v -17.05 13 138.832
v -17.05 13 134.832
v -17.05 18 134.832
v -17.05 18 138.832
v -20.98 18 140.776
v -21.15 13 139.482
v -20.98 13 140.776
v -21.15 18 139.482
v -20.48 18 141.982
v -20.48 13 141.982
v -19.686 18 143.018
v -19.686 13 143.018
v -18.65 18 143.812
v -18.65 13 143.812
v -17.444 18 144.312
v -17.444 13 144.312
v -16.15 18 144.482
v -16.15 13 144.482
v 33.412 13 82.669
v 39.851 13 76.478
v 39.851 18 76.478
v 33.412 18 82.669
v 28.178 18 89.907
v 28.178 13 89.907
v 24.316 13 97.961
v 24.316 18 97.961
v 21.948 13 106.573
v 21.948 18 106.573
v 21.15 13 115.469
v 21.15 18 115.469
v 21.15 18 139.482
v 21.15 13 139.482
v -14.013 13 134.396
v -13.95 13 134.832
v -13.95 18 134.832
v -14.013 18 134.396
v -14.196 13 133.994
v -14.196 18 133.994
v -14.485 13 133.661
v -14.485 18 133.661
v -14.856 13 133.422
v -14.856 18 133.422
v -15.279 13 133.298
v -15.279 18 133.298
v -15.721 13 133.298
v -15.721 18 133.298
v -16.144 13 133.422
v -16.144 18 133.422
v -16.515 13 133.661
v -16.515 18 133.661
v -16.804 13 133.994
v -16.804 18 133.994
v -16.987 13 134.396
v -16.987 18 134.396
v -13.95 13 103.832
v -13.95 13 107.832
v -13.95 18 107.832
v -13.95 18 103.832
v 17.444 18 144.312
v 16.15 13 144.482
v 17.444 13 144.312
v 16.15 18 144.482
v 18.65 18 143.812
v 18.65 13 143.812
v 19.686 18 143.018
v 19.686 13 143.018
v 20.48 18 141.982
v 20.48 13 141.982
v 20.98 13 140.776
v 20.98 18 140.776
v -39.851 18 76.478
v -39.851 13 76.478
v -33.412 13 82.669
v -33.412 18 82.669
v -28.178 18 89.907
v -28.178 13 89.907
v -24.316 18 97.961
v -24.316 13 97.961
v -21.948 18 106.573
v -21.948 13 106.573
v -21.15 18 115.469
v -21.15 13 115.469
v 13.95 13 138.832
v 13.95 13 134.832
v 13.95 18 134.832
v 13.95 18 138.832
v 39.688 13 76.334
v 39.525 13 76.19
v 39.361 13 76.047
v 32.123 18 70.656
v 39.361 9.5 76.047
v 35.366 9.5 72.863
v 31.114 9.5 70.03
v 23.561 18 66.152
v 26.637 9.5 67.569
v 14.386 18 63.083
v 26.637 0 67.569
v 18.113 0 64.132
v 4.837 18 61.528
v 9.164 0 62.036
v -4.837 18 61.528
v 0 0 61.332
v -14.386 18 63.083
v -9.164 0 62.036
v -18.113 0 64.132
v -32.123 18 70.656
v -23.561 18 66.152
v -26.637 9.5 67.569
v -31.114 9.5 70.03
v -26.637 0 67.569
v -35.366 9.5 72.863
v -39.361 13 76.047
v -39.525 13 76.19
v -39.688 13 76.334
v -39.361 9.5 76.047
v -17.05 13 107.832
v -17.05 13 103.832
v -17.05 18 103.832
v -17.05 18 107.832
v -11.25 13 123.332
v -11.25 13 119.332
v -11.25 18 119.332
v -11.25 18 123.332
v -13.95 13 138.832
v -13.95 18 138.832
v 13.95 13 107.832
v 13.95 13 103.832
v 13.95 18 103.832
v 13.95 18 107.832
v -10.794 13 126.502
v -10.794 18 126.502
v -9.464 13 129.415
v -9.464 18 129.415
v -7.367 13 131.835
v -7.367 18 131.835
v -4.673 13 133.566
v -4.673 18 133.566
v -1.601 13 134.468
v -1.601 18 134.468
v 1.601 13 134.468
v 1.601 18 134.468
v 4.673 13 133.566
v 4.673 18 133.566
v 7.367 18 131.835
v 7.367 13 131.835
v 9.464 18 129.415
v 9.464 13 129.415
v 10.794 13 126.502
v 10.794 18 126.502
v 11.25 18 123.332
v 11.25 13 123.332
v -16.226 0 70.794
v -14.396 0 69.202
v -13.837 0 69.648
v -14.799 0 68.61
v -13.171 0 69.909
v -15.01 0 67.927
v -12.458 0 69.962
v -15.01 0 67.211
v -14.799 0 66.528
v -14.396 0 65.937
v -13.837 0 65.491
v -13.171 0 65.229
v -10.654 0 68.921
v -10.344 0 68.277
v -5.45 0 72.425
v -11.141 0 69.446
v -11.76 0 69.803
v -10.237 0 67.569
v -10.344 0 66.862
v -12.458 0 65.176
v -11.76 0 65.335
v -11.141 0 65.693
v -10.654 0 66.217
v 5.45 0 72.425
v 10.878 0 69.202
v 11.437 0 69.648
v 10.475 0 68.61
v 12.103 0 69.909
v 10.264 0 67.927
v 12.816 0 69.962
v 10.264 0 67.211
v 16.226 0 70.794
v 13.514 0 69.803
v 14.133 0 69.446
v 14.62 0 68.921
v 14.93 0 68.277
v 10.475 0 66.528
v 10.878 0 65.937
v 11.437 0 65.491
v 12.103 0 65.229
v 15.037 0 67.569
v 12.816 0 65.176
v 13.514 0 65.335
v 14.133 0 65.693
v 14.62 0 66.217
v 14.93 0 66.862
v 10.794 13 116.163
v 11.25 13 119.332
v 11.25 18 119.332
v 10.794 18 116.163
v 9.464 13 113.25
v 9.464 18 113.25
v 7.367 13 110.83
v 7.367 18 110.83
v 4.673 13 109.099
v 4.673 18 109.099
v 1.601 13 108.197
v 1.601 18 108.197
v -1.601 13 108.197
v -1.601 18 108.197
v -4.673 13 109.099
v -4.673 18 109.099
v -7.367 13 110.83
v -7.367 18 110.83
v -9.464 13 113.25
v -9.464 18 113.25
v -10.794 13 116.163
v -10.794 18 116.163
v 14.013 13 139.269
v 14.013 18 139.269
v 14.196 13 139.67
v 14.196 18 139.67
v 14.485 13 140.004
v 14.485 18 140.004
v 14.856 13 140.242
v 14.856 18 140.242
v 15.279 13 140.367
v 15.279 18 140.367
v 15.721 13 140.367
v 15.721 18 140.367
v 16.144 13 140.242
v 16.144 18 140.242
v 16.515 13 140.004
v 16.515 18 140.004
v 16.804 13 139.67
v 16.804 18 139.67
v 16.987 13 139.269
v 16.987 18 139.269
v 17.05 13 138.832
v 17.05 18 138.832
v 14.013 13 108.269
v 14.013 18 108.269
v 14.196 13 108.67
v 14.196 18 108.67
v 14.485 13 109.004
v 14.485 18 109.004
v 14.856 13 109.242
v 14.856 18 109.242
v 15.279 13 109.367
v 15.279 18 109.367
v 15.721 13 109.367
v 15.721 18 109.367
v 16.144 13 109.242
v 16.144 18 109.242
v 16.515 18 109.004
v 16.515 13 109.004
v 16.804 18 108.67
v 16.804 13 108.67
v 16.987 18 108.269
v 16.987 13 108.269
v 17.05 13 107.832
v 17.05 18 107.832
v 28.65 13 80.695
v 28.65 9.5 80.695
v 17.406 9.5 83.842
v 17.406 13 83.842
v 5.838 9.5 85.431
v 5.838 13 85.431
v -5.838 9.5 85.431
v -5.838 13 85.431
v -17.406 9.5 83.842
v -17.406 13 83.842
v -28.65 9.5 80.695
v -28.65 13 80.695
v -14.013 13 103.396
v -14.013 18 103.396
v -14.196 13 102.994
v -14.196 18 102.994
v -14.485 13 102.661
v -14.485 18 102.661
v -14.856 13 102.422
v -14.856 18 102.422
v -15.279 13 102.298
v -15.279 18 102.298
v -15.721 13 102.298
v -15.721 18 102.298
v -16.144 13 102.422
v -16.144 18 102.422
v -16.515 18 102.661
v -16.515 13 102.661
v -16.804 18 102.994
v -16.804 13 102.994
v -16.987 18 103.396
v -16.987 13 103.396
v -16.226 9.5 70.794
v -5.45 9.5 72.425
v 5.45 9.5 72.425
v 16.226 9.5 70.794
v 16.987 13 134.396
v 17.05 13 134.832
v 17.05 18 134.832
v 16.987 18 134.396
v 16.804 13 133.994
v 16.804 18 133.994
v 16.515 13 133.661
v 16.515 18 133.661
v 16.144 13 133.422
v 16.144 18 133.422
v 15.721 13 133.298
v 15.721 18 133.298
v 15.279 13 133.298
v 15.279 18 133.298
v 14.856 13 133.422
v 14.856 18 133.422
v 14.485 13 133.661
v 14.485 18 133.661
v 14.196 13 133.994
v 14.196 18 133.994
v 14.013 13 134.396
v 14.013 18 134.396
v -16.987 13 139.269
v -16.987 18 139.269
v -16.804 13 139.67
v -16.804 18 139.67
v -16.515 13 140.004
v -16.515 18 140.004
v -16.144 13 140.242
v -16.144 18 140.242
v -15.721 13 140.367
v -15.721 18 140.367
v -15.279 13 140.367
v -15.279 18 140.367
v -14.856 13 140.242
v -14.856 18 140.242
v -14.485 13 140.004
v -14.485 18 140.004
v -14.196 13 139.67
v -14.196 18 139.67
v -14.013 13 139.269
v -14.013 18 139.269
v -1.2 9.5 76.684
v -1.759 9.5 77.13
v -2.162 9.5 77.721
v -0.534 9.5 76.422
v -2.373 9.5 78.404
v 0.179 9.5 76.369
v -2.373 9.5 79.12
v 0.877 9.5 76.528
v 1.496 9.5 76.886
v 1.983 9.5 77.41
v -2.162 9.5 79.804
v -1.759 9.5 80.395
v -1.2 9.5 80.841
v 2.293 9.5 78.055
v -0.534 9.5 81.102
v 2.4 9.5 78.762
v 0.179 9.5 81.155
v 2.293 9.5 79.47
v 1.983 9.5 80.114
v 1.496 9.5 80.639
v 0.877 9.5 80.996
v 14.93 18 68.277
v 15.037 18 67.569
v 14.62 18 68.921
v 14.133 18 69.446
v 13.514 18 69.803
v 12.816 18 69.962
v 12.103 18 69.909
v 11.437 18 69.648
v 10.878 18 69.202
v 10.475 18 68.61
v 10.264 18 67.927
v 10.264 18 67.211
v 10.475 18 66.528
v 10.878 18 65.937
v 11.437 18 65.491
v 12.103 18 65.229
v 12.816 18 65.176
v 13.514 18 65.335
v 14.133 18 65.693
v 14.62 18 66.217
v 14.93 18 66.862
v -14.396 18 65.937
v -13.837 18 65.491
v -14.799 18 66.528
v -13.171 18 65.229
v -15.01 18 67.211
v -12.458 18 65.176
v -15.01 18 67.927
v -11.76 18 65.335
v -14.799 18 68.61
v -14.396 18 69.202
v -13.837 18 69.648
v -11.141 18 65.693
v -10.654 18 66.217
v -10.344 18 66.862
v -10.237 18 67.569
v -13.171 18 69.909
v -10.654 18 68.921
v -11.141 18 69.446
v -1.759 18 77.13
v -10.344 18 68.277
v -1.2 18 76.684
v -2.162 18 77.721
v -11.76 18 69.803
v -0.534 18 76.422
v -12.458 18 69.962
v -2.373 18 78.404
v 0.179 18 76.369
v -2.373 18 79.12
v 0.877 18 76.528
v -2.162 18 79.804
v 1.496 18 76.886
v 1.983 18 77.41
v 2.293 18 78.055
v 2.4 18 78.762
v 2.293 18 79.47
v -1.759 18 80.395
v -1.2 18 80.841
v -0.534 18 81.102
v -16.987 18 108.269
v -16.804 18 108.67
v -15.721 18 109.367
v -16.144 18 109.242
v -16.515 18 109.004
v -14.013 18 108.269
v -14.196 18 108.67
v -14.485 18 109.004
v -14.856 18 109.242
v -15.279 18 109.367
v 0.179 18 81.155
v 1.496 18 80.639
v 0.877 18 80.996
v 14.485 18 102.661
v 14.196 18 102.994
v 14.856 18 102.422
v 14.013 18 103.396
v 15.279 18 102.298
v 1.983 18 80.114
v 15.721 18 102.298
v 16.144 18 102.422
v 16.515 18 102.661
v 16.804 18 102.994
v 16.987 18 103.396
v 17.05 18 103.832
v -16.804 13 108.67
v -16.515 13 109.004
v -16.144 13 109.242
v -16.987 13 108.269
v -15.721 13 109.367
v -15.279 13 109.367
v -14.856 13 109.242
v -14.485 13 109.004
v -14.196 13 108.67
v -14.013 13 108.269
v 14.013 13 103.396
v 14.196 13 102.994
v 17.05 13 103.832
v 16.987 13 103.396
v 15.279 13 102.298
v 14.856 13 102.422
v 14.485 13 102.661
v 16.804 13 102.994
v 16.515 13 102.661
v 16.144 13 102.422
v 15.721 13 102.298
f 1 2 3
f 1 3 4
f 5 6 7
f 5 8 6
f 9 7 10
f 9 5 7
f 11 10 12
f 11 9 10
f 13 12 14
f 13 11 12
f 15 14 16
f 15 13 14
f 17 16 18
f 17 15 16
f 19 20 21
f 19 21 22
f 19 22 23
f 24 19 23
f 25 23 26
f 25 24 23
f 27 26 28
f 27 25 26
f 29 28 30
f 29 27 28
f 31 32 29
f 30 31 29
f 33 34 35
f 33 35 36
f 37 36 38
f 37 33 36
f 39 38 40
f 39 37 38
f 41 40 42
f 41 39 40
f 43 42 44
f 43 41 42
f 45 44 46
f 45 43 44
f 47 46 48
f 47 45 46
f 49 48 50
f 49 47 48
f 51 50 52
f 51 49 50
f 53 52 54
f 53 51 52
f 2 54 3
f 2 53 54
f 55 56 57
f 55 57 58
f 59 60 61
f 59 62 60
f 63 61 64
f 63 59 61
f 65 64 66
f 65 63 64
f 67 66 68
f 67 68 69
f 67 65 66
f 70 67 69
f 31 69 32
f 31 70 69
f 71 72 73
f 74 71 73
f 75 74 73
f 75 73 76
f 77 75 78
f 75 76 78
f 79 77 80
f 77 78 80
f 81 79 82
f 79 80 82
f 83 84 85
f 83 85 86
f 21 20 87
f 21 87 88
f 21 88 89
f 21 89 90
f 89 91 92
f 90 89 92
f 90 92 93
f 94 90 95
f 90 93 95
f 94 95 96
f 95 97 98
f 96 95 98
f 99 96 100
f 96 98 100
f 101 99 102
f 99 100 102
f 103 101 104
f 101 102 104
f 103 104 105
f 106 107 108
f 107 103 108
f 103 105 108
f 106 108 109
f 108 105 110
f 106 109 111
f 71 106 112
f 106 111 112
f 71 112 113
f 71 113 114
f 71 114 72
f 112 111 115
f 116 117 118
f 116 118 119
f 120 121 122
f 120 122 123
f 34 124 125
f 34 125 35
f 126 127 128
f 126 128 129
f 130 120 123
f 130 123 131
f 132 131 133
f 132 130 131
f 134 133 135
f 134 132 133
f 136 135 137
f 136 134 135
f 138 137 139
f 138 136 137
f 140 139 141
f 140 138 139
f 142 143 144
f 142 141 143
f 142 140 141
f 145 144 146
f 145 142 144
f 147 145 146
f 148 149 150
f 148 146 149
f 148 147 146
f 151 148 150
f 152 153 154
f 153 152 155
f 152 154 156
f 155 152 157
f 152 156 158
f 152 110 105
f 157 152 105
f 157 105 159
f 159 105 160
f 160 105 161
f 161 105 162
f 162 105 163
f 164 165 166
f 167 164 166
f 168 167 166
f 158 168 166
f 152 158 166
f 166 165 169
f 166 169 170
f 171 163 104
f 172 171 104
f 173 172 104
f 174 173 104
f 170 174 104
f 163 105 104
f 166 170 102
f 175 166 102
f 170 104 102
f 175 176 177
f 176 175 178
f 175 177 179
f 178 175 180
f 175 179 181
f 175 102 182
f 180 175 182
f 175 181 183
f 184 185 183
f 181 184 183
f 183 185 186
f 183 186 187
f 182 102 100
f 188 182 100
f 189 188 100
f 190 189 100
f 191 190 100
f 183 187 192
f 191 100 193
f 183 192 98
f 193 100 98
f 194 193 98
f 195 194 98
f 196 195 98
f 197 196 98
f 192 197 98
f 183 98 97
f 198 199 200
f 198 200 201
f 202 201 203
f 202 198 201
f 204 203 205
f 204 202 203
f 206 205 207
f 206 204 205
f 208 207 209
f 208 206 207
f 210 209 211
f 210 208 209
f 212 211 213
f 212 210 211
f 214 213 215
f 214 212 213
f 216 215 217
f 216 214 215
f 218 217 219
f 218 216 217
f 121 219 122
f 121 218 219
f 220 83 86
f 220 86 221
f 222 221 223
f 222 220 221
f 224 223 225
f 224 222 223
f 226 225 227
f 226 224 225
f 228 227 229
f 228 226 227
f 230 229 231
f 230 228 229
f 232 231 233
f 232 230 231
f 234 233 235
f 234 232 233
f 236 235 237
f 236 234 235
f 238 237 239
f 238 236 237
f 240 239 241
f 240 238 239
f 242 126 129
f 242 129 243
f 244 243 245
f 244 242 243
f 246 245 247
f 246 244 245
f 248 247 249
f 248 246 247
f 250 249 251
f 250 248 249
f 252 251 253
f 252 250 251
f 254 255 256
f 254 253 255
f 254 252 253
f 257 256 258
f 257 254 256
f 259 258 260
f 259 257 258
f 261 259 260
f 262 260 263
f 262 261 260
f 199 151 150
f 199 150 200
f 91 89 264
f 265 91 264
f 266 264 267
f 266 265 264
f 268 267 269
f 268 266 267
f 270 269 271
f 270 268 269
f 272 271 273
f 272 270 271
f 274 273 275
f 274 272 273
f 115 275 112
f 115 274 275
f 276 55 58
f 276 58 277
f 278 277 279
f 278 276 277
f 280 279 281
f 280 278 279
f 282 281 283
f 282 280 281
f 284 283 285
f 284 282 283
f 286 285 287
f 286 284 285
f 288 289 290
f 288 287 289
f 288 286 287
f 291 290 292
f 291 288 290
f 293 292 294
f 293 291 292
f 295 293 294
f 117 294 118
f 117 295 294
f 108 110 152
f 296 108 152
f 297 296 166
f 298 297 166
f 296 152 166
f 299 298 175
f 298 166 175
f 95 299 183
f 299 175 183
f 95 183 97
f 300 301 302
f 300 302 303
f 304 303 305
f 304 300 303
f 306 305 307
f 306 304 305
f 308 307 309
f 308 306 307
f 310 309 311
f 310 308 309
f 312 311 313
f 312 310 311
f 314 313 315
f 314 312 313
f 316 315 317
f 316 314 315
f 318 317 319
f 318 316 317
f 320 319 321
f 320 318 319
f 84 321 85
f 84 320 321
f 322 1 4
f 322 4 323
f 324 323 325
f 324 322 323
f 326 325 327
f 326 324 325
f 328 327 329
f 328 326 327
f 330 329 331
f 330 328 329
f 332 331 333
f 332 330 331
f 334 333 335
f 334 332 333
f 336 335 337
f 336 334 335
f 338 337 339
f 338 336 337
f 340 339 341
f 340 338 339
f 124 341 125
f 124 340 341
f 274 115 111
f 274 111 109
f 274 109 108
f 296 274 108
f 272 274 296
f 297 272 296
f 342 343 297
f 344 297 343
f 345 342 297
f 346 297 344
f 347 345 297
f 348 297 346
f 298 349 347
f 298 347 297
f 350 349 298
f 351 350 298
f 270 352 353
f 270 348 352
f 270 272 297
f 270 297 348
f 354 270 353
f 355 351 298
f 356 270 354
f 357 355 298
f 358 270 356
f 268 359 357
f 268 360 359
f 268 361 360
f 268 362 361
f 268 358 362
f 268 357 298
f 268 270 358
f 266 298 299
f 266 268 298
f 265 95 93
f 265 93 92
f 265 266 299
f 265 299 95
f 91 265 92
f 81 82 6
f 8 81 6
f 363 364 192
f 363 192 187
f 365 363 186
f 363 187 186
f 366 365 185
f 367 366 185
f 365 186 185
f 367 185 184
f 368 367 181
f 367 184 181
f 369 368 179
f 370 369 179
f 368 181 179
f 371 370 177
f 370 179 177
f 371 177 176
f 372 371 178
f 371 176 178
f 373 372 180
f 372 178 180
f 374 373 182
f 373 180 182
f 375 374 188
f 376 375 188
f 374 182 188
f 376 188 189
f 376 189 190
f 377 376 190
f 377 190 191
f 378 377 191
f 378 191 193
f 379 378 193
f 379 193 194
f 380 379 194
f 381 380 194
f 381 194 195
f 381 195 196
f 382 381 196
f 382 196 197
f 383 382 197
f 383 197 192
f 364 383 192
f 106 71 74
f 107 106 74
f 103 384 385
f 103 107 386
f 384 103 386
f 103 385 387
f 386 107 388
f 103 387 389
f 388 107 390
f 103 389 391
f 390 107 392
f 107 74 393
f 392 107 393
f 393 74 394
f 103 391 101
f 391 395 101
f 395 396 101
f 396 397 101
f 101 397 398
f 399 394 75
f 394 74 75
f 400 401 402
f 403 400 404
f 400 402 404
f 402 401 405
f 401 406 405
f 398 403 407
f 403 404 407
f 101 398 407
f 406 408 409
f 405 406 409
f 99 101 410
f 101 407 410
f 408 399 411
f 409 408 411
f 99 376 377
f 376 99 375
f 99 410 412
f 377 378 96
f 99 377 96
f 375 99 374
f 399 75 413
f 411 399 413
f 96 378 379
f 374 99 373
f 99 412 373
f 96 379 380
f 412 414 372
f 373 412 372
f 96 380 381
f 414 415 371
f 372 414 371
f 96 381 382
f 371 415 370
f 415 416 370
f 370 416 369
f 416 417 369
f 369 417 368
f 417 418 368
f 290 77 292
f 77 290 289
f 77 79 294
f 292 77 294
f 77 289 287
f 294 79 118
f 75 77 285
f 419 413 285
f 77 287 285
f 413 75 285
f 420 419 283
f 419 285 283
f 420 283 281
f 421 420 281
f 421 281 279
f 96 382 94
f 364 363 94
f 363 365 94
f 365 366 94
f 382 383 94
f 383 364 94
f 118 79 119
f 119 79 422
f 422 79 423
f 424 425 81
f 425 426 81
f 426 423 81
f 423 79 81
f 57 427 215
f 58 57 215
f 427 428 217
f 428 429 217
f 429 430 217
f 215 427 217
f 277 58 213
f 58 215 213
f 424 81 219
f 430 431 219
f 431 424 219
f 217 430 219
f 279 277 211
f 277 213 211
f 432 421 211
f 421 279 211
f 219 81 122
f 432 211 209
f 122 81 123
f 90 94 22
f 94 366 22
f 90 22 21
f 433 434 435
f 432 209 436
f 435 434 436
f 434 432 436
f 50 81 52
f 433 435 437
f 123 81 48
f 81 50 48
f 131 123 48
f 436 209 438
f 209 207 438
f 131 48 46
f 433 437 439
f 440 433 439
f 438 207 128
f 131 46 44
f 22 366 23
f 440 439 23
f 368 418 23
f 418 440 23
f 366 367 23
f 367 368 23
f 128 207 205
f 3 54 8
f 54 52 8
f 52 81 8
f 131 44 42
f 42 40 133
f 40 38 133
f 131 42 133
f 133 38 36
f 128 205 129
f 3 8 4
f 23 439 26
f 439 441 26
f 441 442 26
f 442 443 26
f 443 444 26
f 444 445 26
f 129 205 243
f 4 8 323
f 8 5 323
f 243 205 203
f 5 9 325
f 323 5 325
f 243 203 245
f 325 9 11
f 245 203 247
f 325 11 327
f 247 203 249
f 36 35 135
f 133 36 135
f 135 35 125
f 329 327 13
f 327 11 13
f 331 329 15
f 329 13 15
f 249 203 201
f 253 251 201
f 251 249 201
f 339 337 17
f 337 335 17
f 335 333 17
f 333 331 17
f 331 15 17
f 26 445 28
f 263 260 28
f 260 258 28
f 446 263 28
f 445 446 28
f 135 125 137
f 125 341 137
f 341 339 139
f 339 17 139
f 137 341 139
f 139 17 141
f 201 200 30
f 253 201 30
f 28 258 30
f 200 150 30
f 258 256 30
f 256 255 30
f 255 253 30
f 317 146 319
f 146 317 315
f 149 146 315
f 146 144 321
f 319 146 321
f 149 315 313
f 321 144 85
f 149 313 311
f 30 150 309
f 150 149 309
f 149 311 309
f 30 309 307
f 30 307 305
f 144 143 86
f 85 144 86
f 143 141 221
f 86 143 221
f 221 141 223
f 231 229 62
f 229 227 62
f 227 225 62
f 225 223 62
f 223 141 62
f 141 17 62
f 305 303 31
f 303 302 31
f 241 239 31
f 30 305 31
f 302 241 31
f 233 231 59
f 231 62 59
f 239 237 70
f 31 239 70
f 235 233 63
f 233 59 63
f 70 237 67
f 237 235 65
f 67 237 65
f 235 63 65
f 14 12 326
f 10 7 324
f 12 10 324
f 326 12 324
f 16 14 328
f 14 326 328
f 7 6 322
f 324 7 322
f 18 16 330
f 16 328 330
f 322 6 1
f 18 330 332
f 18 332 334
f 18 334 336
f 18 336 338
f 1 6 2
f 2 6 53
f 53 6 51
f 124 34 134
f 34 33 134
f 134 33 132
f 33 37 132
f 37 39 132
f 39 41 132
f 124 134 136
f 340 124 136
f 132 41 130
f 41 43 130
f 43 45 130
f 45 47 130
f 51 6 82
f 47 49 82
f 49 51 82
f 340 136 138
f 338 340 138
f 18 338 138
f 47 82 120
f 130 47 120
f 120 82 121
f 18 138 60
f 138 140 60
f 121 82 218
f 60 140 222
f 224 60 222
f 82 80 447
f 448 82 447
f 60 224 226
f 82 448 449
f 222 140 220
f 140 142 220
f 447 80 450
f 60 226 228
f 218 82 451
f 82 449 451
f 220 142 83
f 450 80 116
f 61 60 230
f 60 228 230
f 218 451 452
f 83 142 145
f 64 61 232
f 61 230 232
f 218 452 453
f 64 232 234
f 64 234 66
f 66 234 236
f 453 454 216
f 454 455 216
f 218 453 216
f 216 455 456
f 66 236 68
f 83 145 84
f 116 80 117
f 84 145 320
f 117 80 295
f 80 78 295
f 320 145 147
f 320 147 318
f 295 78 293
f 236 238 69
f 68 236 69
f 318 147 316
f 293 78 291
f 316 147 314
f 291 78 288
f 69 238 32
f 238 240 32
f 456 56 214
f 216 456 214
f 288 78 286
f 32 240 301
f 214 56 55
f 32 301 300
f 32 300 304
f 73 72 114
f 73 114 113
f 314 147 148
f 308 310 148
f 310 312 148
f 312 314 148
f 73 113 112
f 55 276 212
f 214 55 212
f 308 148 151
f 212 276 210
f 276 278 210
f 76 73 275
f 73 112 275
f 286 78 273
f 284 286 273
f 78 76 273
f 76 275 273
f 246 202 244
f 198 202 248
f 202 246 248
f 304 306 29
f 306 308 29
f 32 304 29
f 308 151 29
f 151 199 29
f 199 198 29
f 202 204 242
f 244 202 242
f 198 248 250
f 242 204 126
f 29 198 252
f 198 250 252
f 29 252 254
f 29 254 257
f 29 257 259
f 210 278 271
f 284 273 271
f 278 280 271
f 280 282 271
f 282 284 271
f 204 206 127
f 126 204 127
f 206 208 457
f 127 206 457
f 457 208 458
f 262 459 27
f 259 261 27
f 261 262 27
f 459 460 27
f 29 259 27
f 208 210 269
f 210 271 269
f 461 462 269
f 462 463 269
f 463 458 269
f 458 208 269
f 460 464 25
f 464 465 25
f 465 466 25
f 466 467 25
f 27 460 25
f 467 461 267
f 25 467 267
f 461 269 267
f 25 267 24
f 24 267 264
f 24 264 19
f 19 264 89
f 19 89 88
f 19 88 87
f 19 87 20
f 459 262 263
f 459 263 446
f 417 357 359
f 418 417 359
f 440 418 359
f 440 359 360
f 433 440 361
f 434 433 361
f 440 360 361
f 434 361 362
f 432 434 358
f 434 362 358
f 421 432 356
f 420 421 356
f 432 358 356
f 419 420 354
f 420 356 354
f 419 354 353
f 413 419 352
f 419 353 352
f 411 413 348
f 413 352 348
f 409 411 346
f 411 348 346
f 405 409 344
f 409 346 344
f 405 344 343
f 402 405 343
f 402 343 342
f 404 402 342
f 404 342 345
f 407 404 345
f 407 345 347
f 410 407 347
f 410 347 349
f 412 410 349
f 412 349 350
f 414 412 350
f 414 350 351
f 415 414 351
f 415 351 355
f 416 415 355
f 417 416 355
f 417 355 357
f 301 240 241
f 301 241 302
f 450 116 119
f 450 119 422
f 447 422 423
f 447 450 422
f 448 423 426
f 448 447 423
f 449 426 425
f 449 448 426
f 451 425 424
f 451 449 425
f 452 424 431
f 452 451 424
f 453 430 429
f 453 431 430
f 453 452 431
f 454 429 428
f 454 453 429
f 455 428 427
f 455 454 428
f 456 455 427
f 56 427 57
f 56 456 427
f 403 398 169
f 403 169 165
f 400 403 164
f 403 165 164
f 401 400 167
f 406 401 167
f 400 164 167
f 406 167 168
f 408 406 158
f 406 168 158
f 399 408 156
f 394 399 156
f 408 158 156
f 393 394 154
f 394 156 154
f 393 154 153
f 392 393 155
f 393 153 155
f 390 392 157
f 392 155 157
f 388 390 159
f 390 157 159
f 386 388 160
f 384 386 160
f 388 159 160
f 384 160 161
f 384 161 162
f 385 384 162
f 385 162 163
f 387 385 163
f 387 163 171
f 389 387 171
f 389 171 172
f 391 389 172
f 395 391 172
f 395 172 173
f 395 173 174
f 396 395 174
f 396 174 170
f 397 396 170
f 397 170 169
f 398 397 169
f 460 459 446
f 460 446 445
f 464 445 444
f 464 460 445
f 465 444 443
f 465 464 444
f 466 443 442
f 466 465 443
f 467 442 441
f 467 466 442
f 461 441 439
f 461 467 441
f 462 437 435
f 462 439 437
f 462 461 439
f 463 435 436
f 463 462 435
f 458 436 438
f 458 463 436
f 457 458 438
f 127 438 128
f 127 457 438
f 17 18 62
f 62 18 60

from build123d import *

# Parameters (mm, degrees)
SKETCH1_R                = 72.63
BOSS_EXTRUDE1_DEPTH      = 13
BOSS_EXTRUDE2_DEPTH      = 5
SKETCH4_R                = 85.63
BOSS_EXTRUDE3_DEPTH      = 3.5
BOSS_EXTRUDE3_DEPTH_BACK = 5
CUT_EXTRUDE1_DEPTH       = 6
FILLET1_R                = 50
FILLET2_R                = 5
SKETCH8_R                = 2.4
CUT_EXTRUDE2_DEPTH       = 9.5
SKETCH10_OUTSIDE_W       = 230.742
SKETCH10_OUTSIDE_H       = 289.594
SKETCH10_OUTSIDE_R       = 60
CUT_EXTRUDE3_DEPTH       = 19
SKETCH11_R               = 2.4
CUT_EXTRUDE4_DEPTH       = 19


with BuildPart() as part:
    # Sketch1 → Boss-Extrude1 (new body)
    with BuildSketch(Plane(origin=(0, 0, 0), x_dir=(1, 0, 0), z_dir=(0, 1, 0))):
        Circle(SKETCH1_R)
    extrude(amount=BOSS_EXTRUDE1_DEPTH)

    # Sketch2 → Boss-Extrude2 (add)
    with BuildSketch(Plane(origin=(0, 13, 0), x_dir=(1, 0, 0), z_dir=(0, 1, 0))):
        with BuildLine():
            Line((-21.15, -69.482331567), (-21.15, -144.482331567))
            Line((-21.15, -144.482331567), (21.15, -144.482331567))
            Line((21.15, -144.482331567), (21.15, -69.482331567))
            ThreePointArc((21.15, -69.482331567), (0, 72.63), (-21.15, -69.482331567))
        make_face()
    extrude(amount=BOSS_EXTRUDE2_DEPTH)

    # Sketch4 → Boss-Extrude3 (add, two sides)
    with BuildSketch(Plane.XZ.offset(-13)) as boss_extrude3_sk:
        Circle(SKETCH4_R)
    extrude(amount=BOSS_EXTRUDE3_DEPTH)
    extrude(boss_extrude3_sk.sketch, amount=-BOSS_EXTRUDE3_DEPTH_BACK)

    # Sketch5 → Cut-Extrude1 (cut, through all)
    with BuildSketch(Plane.XZ.offset(-13)):
        with BuildLine():
            Line((11.25, 123.332331567), (11.25, 119.332331567))
            ThreePointArc((11.25, 119.332331567), (0, 108.082331567), (-11.25, 119.332331567))
            Line((-11.25, 119.332331567), (-11.25, 123.332331567))
            ThreePointArc((-11.25, 123.332331567), (0, 134.582331567), (11.25, 123.332331567))
        make_face()
        with BuildLine():
            Line((17.05, 107.832331567), (17.05, 103.832331567))
            ThreePointArc((17.05, 103.832331567), (15.5, 102.282331567), (13.95, 103.832331567))
            Line((13.95, 103.832331567), (13.95, 107.832331567))
            ThreePointArc((13.95, 107.832331567), (15.5, 109.382331567), (17.05, 107.832331567))
        make_face()
        with BuildLine():
            Line((17.05, 138.832331567), (17.05, 134.832331567))
            ThreePointArc((17.05, 134.832331567), (15.5, 133.282331567), (13.95, 134.832331567))
            Line((13.95, 134.832331567), (13.95, 138.832331567))
            ThreePointArc((13.95, 138.832331567), (15.5, 140.382331567), (17.05, 138.832331567))
        make_face()
        with BuildLine():
            Line((-13.95, 138.832331567), (-13.95, 134.832331567))
            ThreePointArc((-13.95, 134.832331567), (-15.5, 133.282331567), (-17.05, 134.832331567))
            Line((-17.05, 134.832331567), (-17.05, 138.832331567))
            ThreePointArc((-17.05, 138.832331567), (-15.5, 140.382331567), (-13.95, 138.832331567))
        make_face()
        with BuildLine():
            Line((-13.95, 107.832331567), (-13.95, 103.832331567))
            ThreePointArc((-13.95, 103.832331567), (-15.5, 102.282331567), (-17.05, 103.832331567))
            Line((-17.05, 103.832331567), (-17.05, 107.832331567))
            ThreePointArc((-17.05, 107.832331567), (-15.5, 109.382331567), (-13.95, 107.832331567))
        make_face()
    extrude(amount=-CUT_EXTRUDE1_DEPTH, mode=Mode.SUBTRACT)

    # Fillet1
    fillet1_edges = [part.edges().sort_by_distance(p)[0] for p in [
        (-21.15, 15.5, 82.976951017),
        (21.15, 15.5, 82.976951017),
    ]]
    fillet(fillet1_edges, radius=FILLET1_R)

    # Fillet2
    fillet2_edges = [part.edges().sort_by_distance(p)[0] for p in [
        (-21.15, 15.5, 144.482331567),
        (21.15, 15.5, 144.482331567),
    ]]
    fillet(fillet2_edges, radius=FILLET2_R)

    # Sketch8 → Cut-Extrude2 (cut, through all)
    with BuildSketch(Plane.XZ.offset(-9.5)):
        with Locations((0, 78.7622)):
            Circle(SKETCH8_R)
    extrude(amount=-CUT_EXTRUDE2_DEPTH, mode=Mode.SUBTRACT)

    # Sketch10 outside → Cut-Extrude3 (cut, through all)
    with BuildSketch(Plane.XZ):
        with Locations((0, 29.426)):
            Rectangle(SKETCH10_OUTSIDE_W, SKETCH10_OUTSIDE_H)
        with Locations((0, 121.332331567)):
            Circle(SKETCH10_OUTSIDE_R, mode=Mode.SUBTRACT)
    extrude(amount=-CUT_EXTRUDE3_DEPTH, mode=Mode.SUBTRACT)

    # Sketch11 → Cut-Extrude4 (cut, through all)
    with BuildSketch(Plane.XZ):
        with Locations((-12.636876971, 67.569177035)):
            Circle(SKETCH11_R)
        with Locations((12.636876971, 67.569177035)):
            Circle(SKETCH11_R)
    extrude(amount=-CUT_EXTRUDE4_DEPTH, mode=Mode.SUBTRACT)


solid = part.part
